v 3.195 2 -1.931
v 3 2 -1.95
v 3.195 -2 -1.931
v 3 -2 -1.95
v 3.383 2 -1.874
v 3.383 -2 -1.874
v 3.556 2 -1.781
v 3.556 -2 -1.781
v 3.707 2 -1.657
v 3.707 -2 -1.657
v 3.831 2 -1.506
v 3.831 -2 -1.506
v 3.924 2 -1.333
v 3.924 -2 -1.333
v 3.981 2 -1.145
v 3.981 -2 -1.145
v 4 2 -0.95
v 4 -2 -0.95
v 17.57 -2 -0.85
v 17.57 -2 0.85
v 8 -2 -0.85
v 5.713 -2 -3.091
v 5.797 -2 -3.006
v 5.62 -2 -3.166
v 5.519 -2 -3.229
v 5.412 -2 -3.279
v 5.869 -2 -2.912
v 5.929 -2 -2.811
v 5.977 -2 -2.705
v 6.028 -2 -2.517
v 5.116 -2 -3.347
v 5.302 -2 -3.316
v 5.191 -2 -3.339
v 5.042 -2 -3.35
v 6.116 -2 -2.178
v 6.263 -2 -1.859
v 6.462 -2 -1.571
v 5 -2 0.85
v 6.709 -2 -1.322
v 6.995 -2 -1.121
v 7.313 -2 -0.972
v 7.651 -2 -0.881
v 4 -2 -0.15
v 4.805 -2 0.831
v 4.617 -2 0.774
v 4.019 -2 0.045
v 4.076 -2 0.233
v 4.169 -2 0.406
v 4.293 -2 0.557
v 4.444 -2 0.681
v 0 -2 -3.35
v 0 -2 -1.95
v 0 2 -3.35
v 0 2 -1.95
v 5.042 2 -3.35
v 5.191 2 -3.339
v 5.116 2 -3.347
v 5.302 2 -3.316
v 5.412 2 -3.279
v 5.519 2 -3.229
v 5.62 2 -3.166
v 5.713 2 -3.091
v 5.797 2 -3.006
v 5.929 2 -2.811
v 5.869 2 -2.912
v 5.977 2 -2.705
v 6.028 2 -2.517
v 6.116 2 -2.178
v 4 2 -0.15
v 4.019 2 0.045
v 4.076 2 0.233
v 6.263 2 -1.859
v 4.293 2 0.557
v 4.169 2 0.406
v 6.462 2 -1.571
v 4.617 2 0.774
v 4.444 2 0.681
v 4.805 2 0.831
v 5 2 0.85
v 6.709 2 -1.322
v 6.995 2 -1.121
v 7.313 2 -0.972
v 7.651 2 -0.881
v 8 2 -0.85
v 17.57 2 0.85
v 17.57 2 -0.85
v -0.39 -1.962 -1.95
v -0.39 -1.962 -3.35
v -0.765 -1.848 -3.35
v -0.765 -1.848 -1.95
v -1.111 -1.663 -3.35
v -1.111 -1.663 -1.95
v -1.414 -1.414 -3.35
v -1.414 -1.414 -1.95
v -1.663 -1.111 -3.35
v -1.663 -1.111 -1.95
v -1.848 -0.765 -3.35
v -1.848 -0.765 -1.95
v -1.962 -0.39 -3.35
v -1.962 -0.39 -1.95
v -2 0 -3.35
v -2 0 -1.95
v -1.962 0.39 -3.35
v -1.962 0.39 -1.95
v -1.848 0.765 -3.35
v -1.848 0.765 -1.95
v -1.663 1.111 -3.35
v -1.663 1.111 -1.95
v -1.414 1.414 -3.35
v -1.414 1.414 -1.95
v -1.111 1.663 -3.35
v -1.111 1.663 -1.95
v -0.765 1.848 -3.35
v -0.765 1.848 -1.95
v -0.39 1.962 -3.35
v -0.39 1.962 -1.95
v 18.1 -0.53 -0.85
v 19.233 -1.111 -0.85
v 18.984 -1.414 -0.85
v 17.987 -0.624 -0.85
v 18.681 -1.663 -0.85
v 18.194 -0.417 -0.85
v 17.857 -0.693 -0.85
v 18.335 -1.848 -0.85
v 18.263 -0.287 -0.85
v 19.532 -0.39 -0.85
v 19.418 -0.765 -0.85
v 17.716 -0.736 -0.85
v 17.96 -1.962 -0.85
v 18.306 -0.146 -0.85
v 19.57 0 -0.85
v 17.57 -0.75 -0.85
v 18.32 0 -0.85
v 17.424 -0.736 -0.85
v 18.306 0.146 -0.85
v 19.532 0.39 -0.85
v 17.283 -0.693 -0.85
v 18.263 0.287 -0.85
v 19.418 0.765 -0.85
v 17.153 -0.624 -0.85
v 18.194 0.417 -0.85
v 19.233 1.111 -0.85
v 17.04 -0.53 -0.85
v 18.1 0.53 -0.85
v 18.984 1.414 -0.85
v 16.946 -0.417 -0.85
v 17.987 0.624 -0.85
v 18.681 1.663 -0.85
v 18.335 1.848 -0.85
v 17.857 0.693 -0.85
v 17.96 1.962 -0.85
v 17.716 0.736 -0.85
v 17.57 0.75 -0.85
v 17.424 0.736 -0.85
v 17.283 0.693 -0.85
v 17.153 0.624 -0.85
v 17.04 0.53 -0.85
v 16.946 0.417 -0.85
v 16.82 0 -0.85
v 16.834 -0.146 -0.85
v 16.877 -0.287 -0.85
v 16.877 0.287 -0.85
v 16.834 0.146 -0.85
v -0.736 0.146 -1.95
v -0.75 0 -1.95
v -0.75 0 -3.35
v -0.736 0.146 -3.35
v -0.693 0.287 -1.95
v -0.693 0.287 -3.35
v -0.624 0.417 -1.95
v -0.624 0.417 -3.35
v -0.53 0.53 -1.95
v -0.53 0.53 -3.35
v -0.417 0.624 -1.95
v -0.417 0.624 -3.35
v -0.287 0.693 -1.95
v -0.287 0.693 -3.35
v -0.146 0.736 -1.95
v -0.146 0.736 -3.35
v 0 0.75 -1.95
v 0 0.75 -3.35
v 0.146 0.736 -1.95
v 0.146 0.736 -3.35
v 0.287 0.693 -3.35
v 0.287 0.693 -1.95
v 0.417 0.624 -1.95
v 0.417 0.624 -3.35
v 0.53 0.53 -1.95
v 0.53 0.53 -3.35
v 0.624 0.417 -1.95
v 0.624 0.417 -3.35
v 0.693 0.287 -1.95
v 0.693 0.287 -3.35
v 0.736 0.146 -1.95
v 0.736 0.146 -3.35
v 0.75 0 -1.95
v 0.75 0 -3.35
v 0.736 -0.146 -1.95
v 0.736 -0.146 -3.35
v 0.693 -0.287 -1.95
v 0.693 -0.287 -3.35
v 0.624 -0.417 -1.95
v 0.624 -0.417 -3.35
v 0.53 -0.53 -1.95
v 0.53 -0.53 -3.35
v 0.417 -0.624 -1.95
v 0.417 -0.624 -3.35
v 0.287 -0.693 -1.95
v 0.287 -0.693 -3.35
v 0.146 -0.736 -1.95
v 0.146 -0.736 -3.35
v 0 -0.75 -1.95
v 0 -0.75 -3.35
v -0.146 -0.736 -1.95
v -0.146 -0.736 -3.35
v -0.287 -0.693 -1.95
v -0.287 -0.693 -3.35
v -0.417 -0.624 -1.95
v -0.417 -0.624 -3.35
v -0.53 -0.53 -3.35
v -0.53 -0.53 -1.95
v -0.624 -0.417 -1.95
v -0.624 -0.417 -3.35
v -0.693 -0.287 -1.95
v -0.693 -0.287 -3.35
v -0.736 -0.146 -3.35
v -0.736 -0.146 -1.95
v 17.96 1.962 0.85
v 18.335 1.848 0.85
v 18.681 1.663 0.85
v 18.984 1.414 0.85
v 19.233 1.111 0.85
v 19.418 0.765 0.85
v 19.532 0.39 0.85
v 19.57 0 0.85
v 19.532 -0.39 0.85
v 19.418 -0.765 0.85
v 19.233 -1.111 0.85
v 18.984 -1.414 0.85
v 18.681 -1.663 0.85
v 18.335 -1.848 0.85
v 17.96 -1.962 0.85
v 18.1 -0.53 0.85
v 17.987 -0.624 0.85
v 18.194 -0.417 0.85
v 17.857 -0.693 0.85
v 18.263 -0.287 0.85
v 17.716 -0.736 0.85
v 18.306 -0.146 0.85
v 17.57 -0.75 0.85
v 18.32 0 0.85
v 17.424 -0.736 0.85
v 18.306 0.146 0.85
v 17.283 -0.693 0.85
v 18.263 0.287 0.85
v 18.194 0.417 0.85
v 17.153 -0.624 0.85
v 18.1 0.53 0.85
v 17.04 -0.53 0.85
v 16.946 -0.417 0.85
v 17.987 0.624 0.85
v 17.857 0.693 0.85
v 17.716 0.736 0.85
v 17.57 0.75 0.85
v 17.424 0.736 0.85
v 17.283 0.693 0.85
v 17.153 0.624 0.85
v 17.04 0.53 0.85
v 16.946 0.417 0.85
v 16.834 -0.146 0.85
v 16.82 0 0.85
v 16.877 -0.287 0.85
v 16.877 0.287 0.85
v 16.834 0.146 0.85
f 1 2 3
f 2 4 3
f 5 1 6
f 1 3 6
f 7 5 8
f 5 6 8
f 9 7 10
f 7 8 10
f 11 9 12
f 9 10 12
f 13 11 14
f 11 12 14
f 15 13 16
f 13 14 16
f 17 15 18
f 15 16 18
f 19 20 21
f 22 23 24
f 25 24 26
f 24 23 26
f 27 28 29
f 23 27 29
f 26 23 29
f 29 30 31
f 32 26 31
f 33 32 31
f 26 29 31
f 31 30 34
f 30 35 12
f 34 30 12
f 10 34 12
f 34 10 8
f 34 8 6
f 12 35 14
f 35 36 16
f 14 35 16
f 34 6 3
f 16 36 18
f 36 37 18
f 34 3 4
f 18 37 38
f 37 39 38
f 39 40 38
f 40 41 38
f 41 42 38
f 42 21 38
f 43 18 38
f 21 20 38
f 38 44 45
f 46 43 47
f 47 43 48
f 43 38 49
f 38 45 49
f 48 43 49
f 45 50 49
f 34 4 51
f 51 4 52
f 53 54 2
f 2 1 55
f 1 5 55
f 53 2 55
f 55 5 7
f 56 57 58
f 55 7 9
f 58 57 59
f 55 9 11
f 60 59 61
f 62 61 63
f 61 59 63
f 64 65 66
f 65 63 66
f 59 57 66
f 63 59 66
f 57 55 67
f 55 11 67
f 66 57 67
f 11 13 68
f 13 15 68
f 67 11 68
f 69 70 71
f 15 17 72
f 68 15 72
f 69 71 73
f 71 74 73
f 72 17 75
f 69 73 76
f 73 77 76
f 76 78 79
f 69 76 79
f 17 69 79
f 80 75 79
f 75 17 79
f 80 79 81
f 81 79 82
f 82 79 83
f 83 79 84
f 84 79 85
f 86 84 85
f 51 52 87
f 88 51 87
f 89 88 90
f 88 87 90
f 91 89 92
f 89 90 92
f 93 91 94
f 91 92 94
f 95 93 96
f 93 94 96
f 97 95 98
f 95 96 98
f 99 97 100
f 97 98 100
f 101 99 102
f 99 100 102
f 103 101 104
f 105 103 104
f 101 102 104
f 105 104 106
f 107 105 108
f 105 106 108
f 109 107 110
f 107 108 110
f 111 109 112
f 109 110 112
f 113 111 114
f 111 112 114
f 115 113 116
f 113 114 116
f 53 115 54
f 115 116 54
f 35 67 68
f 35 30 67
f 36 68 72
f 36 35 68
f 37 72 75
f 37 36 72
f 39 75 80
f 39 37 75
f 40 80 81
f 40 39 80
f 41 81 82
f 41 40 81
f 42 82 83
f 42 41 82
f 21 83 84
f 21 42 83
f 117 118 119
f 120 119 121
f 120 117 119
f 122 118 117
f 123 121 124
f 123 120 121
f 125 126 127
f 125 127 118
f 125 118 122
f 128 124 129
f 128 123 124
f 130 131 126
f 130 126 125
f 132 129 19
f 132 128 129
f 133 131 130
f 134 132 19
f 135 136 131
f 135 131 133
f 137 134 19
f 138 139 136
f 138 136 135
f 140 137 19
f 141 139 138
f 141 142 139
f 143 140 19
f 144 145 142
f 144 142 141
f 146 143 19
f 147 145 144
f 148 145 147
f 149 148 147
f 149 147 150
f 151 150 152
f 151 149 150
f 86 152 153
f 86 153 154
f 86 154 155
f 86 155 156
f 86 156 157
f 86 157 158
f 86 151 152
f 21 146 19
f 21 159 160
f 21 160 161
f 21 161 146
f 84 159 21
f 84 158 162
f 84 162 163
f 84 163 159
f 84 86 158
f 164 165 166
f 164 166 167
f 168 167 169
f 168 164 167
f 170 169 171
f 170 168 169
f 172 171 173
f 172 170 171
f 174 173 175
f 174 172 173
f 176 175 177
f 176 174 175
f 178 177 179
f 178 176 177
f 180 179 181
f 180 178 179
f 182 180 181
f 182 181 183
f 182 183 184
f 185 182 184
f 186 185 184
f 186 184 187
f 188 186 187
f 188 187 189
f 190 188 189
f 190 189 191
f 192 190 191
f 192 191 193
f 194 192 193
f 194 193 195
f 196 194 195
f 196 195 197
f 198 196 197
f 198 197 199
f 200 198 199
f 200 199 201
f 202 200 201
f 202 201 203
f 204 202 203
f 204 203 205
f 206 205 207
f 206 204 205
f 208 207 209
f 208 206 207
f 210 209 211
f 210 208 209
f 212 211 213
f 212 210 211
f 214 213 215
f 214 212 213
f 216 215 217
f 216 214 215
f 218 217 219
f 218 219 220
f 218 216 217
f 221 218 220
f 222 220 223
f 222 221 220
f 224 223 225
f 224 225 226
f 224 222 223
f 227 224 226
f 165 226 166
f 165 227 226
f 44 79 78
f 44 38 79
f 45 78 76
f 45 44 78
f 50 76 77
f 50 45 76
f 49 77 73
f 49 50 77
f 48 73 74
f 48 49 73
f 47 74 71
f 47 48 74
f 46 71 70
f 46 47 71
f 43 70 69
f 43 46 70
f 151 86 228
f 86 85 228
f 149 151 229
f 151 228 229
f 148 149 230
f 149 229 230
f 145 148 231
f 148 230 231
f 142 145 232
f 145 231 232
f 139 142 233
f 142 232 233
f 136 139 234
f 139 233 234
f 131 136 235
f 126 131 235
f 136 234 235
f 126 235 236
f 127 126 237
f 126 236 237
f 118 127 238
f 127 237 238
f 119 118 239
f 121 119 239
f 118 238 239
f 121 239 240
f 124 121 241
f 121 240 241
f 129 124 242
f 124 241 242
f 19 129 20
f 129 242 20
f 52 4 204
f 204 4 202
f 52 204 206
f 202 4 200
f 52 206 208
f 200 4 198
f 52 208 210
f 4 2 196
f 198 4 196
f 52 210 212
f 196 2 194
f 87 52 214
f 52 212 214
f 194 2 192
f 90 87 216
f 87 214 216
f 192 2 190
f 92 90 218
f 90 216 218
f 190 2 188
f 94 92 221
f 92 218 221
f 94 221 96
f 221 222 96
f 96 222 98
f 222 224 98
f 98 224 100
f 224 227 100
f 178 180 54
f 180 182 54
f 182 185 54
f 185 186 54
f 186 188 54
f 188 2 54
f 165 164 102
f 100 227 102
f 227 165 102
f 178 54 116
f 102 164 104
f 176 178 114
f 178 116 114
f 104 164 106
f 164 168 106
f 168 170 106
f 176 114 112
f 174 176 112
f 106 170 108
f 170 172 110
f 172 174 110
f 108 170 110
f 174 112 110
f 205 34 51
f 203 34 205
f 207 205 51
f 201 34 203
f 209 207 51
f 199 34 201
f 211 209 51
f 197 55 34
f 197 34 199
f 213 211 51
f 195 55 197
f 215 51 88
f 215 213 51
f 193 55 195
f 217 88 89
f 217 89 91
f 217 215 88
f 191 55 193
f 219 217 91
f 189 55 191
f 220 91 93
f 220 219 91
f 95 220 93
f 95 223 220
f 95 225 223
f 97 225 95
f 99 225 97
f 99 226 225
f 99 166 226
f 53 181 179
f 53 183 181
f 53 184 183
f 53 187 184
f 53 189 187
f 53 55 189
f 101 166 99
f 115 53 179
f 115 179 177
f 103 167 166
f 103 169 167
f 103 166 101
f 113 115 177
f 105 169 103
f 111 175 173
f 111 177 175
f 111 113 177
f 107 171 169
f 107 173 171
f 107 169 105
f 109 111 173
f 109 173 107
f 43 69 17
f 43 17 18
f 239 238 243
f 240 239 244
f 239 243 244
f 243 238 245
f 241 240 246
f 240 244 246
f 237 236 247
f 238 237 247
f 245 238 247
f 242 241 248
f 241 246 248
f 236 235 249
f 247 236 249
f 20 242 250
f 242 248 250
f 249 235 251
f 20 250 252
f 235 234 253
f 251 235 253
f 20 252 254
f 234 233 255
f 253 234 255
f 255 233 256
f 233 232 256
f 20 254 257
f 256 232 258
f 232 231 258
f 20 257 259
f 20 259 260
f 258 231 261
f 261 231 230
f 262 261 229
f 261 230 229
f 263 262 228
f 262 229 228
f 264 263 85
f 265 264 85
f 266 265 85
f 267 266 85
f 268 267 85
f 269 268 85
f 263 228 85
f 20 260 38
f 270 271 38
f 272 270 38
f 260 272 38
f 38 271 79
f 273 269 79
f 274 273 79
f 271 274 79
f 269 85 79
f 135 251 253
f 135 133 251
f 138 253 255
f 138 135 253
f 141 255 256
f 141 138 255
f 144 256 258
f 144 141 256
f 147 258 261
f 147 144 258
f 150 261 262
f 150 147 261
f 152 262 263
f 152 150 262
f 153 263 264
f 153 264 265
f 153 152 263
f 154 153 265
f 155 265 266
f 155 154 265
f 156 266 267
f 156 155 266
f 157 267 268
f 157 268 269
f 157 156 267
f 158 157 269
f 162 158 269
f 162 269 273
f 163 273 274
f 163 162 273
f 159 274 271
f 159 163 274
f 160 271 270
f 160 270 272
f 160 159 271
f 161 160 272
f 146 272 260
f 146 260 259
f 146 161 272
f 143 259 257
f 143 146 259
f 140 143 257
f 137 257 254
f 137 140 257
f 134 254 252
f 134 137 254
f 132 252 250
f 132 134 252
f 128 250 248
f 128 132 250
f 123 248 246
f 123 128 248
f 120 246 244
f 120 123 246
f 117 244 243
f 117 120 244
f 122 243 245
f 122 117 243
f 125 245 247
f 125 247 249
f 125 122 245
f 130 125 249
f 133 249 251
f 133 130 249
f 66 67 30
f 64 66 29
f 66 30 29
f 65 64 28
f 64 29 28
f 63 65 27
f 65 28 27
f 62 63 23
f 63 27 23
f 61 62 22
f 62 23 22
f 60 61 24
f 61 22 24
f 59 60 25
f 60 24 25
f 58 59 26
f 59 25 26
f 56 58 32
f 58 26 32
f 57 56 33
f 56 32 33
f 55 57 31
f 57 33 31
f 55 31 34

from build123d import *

# Parameters (mm, degrees)
SKETCH1_R           = 0.75
BOSS_EXTRUDE1_DEPTH = 0.85
SKETCH2_R           = 0.75
BOSS_EXTRUDE2_DEPTH = 2.5
SKETCH3_R           = 0.75
CUT_EXTRUDE1_DEPTH  = 2.8
FILLET1_R           = 2
FILLET2_R           = 1
FILLET3_R           = 1


with BuildPart() as part:
    # Sketch1 → Boss-Extrude1 (new body, symmetric)
    with BuildSketch(Plane.XY):
        with BuildLine():
            Line((0, 2), (17.57, 2))
            ThreePointArc((17.57, 2), (19.57, 0), (17.57, -2))
            Line((17.57, -2), (0, -2))
            ThreePointArc((0, -2), (-2, 0), (0, 2))
        make_face()
        Circle(SKETCH1_R, mode=Mode.SUBTRACT)
        with Locations((17.57, 0)):
            Circle(SKETCH1_R, mode=Mode.SUBTRACT)
    extrude(amount=BOSS_EXTRUDE1_DEPTH, both=True)

    # Sketch2 → Boss-Extrude2 (add)
    with BuildSketch(Plane(origin=(0, 0, -0.85), x_dir=(-1, 0, 0), z_dir=(0, 0, -1))):
        with BuildLine():
            Line((-6, 2), (-6, -2))
            Line((-6, -2), (0, -2))
            ThreePointArc((0, -2), (2, 0), (0, 2))
            Line((0, 2), (-6, 2))
        make_face()
        Circle(SKETCH2_R, mode=Mode.SUBTRACT)
    extrude(amount=BOSS_EXTRUDE2_DEPTH)

    # Sketch3 → Cut-Extrude1 (cut)
    with BuildSketch(Plane.XY.offset(0.85)):
        with BuildLine():
            Line((4, 2), (4, -2))
            Line((4, -2), (0, -2))
            ThreePointArc((0, -2), (-2, 0), (0, 2))
            Line((0, 2), (4, 2))
        make_face()
        Circle(SKETCH3_R, mode=Mode.SUBTRACT)
    extrude(amount=-CUT_EXTRUDE1_DEPTH, mode=Mode.SUBTRACT)

    # Fillet1
    fillet1_edges = [part.edges().sort_by_distance(p)[0] for p in [
        (6, 0, -0.85),
    ]]
    fillet(fillet1_edges, radius=FILLET1_R)

    # Fillet2
    fillet2_edges = [part.edges().sort_by_distance(p)[0] for p in [
        (6, 0, -3.35),
    ]]
    fillet(fillet2_edges, radius=FILLET2_R)

    # Fillet3
    fillet3_edges = [part.edges().sort_by_distance(p)[0] for p in [
        (4, 0, -1.95),
        (4, 0, 0.85),
    ]]
    fillet(fillet3_edges, radius=FILLET3_R)


solid = part.part
